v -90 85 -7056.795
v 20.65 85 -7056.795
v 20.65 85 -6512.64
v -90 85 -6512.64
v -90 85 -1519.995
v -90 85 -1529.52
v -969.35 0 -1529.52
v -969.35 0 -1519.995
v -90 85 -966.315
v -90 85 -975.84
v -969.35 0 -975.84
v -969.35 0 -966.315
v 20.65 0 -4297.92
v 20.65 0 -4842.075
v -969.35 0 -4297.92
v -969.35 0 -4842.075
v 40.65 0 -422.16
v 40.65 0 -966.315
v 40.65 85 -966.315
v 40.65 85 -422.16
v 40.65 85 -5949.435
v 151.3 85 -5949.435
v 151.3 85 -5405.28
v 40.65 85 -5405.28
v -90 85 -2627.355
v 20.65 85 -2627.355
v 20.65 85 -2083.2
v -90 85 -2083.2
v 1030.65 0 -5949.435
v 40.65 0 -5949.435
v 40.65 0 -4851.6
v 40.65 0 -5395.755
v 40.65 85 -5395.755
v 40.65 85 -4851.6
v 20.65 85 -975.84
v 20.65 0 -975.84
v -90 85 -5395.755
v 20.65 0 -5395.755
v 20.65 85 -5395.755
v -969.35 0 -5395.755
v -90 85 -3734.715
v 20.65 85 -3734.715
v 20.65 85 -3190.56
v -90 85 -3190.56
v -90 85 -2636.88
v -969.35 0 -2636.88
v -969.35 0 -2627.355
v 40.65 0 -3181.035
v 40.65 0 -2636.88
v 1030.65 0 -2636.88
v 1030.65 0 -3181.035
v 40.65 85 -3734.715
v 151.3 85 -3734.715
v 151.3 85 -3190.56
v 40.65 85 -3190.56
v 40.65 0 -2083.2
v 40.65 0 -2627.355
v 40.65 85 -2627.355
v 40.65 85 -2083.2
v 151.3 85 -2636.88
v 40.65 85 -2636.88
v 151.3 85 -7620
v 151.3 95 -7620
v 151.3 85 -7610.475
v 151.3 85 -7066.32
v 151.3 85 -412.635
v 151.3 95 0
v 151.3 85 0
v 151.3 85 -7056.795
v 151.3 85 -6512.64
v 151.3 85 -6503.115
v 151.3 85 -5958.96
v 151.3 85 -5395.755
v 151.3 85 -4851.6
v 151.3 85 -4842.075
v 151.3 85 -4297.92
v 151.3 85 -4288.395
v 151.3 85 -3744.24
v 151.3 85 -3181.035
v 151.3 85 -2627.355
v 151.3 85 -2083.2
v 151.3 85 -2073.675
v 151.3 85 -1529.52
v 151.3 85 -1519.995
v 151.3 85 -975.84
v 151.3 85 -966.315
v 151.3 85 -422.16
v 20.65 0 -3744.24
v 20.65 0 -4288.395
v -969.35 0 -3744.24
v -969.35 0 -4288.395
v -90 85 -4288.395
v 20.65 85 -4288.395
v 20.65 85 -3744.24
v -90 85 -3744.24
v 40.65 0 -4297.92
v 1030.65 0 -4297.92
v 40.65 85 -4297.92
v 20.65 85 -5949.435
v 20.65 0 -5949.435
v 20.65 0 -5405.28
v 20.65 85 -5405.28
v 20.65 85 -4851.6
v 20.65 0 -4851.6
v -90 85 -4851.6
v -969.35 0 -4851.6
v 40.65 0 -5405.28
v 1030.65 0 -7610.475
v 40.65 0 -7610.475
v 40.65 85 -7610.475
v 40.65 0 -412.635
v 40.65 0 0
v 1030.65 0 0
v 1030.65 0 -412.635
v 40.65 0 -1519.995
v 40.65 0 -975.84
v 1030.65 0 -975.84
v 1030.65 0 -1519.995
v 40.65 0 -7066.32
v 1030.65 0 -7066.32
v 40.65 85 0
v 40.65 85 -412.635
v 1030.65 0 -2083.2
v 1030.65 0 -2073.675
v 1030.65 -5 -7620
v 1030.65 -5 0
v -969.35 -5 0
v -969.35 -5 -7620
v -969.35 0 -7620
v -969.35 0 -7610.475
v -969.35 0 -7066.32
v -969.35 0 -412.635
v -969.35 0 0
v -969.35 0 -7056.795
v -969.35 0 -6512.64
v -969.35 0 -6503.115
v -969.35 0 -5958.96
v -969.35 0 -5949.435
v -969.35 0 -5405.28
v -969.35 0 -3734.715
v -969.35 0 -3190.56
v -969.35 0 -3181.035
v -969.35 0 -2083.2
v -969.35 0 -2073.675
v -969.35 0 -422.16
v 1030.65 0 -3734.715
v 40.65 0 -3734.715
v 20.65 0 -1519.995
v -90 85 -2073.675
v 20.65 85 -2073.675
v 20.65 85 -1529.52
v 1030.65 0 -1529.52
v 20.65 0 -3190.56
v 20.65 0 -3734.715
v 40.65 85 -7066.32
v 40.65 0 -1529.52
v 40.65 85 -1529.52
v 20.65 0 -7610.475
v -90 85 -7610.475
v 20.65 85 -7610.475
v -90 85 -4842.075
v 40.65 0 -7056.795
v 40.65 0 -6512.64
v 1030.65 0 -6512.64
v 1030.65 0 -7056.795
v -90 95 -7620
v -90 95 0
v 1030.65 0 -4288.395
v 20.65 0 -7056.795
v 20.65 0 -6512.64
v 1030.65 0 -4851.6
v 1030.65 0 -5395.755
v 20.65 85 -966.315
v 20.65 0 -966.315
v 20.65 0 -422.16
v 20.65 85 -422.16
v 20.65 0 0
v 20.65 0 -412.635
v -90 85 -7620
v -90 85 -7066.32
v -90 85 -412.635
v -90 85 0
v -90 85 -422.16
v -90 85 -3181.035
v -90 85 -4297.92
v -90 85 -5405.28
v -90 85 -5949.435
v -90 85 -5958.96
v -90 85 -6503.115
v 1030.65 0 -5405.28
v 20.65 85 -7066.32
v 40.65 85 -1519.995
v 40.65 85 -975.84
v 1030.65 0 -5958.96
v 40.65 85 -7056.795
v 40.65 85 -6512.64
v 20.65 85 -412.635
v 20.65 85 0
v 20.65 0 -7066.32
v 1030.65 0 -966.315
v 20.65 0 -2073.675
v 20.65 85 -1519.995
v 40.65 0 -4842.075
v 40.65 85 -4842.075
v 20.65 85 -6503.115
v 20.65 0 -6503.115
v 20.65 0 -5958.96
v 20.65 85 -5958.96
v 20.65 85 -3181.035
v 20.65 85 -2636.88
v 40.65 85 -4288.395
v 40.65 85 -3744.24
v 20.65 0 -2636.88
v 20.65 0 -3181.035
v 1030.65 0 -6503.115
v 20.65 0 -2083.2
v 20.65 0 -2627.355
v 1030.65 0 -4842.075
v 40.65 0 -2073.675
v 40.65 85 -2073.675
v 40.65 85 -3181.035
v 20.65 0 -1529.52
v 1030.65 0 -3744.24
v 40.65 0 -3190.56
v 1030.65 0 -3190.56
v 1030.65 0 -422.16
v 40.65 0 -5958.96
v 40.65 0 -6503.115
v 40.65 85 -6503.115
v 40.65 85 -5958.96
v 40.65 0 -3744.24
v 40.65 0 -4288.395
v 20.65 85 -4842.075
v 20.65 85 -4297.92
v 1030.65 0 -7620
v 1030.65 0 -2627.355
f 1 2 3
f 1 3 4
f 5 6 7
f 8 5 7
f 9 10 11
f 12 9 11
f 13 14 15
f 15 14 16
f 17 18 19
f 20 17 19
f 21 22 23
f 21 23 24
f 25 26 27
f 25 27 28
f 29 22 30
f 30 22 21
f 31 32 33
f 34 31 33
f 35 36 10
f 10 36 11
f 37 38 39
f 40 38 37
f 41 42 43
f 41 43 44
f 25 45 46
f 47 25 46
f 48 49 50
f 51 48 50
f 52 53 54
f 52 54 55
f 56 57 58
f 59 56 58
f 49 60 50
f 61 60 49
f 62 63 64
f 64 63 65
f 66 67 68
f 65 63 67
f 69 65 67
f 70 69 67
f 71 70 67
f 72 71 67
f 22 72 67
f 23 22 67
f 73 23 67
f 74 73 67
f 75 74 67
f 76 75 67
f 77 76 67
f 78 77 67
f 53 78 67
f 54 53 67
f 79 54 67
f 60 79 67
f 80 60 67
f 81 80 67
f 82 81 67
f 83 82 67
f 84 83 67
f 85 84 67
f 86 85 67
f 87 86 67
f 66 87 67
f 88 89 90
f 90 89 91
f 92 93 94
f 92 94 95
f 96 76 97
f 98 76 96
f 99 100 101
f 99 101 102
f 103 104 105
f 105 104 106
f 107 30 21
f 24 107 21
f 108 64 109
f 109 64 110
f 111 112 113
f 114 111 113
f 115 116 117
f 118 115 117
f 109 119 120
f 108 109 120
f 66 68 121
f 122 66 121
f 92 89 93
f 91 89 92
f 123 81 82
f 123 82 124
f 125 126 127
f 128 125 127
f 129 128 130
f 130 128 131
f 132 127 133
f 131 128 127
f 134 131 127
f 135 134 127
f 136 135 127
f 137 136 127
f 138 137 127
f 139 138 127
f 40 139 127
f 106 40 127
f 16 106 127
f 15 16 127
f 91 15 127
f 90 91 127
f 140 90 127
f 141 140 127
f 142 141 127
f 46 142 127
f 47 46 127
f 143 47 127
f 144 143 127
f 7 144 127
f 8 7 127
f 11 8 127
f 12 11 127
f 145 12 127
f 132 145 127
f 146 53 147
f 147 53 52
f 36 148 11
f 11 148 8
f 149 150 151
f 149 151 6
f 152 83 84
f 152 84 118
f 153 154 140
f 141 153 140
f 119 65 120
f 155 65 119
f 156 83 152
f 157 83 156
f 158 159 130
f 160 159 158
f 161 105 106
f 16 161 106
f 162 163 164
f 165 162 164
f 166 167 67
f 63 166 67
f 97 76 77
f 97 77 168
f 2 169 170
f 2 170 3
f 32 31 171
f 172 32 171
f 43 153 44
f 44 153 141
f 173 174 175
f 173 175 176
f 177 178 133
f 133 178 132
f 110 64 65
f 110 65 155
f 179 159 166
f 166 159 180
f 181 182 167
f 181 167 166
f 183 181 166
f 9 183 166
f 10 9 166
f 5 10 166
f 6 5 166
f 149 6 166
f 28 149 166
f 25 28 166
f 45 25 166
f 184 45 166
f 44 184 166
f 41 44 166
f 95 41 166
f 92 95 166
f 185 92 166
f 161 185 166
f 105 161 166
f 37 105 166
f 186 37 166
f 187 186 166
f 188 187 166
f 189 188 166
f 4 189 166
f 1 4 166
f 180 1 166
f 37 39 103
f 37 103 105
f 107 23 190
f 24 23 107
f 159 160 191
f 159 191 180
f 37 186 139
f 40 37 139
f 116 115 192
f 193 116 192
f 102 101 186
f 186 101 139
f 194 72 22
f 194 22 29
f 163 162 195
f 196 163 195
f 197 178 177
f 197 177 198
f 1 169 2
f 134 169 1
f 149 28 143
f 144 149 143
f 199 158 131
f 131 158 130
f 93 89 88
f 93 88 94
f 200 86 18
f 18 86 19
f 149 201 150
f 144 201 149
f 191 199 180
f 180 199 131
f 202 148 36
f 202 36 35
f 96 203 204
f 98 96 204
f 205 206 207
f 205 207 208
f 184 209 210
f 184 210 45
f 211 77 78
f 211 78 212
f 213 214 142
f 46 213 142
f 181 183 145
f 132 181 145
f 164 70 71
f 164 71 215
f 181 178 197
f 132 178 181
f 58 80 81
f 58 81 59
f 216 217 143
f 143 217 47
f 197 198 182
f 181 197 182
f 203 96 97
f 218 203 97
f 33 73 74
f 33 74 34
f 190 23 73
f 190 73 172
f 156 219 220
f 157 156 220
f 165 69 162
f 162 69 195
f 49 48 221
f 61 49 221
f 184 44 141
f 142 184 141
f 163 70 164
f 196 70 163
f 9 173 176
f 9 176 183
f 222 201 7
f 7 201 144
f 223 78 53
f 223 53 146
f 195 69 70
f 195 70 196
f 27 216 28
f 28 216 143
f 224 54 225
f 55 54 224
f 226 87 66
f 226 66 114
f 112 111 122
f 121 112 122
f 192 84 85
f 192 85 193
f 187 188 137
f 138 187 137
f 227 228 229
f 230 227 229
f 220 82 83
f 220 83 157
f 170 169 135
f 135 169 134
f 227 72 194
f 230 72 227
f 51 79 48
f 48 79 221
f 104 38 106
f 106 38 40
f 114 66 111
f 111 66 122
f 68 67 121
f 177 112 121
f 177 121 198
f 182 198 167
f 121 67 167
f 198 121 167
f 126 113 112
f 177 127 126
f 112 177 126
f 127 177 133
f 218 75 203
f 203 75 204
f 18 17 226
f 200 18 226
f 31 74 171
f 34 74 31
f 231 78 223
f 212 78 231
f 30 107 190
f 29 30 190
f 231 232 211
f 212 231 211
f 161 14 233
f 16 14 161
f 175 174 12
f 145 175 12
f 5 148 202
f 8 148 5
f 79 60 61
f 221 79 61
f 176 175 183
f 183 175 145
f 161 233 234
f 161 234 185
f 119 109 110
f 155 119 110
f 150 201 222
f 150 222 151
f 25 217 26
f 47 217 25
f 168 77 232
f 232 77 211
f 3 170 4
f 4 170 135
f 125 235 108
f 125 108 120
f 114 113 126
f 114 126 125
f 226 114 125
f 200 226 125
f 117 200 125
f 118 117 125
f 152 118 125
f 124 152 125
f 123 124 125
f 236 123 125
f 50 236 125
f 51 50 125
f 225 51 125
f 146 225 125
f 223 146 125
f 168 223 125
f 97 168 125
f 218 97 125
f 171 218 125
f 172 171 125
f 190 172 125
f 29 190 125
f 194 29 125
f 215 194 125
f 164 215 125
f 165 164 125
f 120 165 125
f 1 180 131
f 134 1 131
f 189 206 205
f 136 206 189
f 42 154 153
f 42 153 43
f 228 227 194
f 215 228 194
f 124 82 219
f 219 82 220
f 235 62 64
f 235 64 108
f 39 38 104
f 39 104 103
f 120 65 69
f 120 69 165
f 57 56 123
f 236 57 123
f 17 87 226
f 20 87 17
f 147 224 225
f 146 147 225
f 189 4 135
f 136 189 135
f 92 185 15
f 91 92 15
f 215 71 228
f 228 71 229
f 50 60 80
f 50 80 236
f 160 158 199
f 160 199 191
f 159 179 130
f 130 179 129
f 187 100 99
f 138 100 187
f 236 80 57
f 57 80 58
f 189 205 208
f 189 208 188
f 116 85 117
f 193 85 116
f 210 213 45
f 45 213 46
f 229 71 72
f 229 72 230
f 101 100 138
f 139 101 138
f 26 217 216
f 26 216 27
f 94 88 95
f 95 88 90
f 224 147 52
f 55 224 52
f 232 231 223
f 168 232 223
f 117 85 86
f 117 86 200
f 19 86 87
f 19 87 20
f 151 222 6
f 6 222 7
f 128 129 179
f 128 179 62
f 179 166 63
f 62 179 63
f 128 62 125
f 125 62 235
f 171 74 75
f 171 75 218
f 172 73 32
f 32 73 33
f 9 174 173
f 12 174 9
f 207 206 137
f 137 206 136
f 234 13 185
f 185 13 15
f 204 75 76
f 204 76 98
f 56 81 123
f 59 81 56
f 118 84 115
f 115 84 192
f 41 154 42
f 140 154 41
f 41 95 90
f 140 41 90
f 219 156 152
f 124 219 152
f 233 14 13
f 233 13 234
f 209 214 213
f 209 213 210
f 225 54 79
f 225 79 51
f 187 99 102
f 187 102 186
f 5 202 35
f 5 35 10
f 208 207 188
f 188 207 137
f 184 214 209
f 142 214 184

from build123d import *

# Parameters (mm, degrees)
BOSS_EXTRUDE1_DEPTH   = 7620
SKETCH7_W             = 110.65
SKETCH7_H             = 85
CUT_EXTRUDE3_DEPTH    = 7690.971678914
BOSS_EXTRUDE3_DEPTH   = 9.525
LPATTERN2_COUNT       = 14
LPATTERN2_PITCH       = 553.68
MIRROR2_COPY_1_DEPTH  = 9.525
MIRROR2_COPY_2_DEPTH  = 9.525
MIRROR2_COPY_3_DEPTH  = 9.525
MIRROR2_COPY_4_DEPTH  = 9.525
MIRROR2_COPY_5_DEPTH  = 9.525
MIRROR2_COPY_6_DEPTH  = 9.525
MIRROR2_COPY_7_DEPTH  = 9.525
MIRROR2_COPY_8_DEPTH  = 9.525
MIRROR2_COPY_9_DEPTH  = 9.525
MIRROR2_COPY_10_DEPTH = 9.525
MIRROR2_COPY_11_DEPTH = 9.525
MIRROR2_COPY_12_DEPTH = 9.525
MIRROR2_COPY_13_DEPTH = 9.525


with BuildPart() as part:
    # Sketch1 → Boss-Extrude1 (new body)
    with BuildSketch(Plane.XY):
        Polygon((-90, 95), (151.3, 95), (151.3, 0), (1030.65, 0), (1030.65, -5), (-969.35, -5), (-969.35, 0), (-90, 0), align=None)
    extrude(amount=-BOSS_EXTRUDE1_DEPTH)

    # Sketch7 → Cut-Extrude3 (cut, through all)
    with BuildSketch(Plane(origin=(0, 0, -7620), x_dir=(-1, 0, 0), z_dir=(0, 0, -1))):
        with Locations((-95.975, 42.5)):
            Rectangle(SKETCH7_W, SKETCH7_H)
        with Locations((34.675, 42.5)):
            Rectangle(SKETCH7_W, SKETCH7_H)
    extrude(amount=-CUT_EXTRUDE3_DEPTH, mode=Mode.SUBTRACT)

    # Sketch8 → Boss-Extrude3 (add)
    with BuildSketch(Plane(origin=(0, 0, -7620), x_dir=(-1, 0, 0), z_dir=(0, 0, -1))):
        Polygon((-40.65, 0), (-40.65, 85), (-151.3, 85), (-1030.65, 0), align=None)
    boss_extrude3 = extrude(amount=-BOSS_EXTRUDE3_DEPTH)

    # LPattern2: Boss-Extrude3 ×14
    with Locations(*[(0, 0, i * LPATTERN2_PITCH) for i in range(1, LPATTERN2_COUNT)]):
        add(boss_extrude3)

    # Mirror2: Boss-Extrude3 across plane
    add(boss_extrude3.mirror(Plane(origin=(30.65, 0, 0), x_dir=(0, 0, 1), z_dir=(1, 0, 0))))

    # Mirror2 copy 1 sketch → Mirror2 copy 1 (add)
    with BuildSketch(Plane(origin=(61.3, 0, -7066.32), x_dir=(1, 0, 0), z_dir=(0, 0, -1))):
        Polygon((-40.65, 0), (-40.65, -85), (-151.3, -85), (-1030.65, 0), align=None)
    extrude(amount=-MIRROR2_COPY_1_DEPTH)

    # Mirror2 copy 2 sketch → Mirror2 copy 2 (add)
    with BuildSketch(Plane(origin=(61.3, 0, -6512.64), x_dir=(1, 0, 0), z_dir=(0, 0, -1))):
        Polygon((-40.65, 0), (-40.65, -85), (-151.3, -85), (-1030.65, 0), align=None)
    extrude(amount=-MIRROR2_COPY_2_DEPTH)

    # Mirror2 copy 3 sketch → Mirror2 copy 3 (add)
    with BuildSketch(Plane(origin=(61.3, 0, -5958.96), x_dir=(1, 0, 0), z_dir=(0, 0, -1))):
        Polygon((-40.65, 0), (-40.65, -85), (-151.3, -85), (-1030.65, 0), align=None)
    extrude(amount=-MIRROR2_COPY_3_DEPTH)

    # Mirror2 copy 4 sketch → Mirror2 copy 4 (add)
    with BuildSketch(Plane(origin=(61.3, 0, -5405.28), x_dir=(1, 0, 0), z_dir=(0, 0, -1))):
        Polygon((-40.65, 0), (-40.65, -85), (-151.3, -85), (-1030.65, 0), align=None)
    extrude(amount=-MIRROR2_COPY_4_DEPTH)

    # Mirror2 copy 5 sketch → Mirror2 copy 5 (add)
    with BuildSketch(Plane(origin=(61.3, 0, -4851.6), x_dir=(1, 0, 0), z_dir=(0, 0, -1))):
        Polygon((-40.65, 0), (-40.65, -85), (-151.3, -85), (-1030.65, 0), align=None)
    extrude(amount=-MIRROR2_COPY_5_DEPTH)

    # Mirror2 copy 6 sketch → Mirror2 copy 6 (add)
    with BuildSketch(Plane(origin=(61.3, 0, -4297.92), x_dir=(1, 0, 0), z_dir=(0, 0, -1))):
        Polygon((-40.65, 0), (-40.65, -85), (-151.3, -85), (-1030.65, 0), align=None)
    extrude(amount=-MIRROR2_COPY_6_DEPTH)

    # Mirror2 copy 7 sketch → Mirror2 copy 7 (add)
    with BuildSketch(Plane(origin=(61.3, 0, -3744.24), x_dir=(1, 0, 0), z_dir=(0, 0, -1))):
        Polygon((-40.65, 0), (-40.65, -85), (-151.3, -85), (-1030.65, 0), align=None)
    extrude(amount=-MIRROR2_COPY_7_DEPTH)

    # Mirror2 copy 8 sketch → Mirror2 copy 8 (add)
    with BuildSketch(Plane(origin=(61.3, 0, -3190.56), x_dir=(1, 0, 0), z_dir=(0, 0, -1))):
        Polygon((-40.65, 0), (-40.65, -85), (-151.3, -85), (-1030.65, 0), align=None)
    extrude(amount=-MIRROR2_COPY_8_DEPTH)

    # Mirror2 copy 9 sketch → Mirror2 copy 9 (add)
    with BuildSketch(Plane(origin=(61.3, 0, -2636.88), x_dir=(1, 0, 0), z_dir=(0, 0, -1))):
        Polygon((-40.65, 0), (-40.65, -85), (-151.3, -85), (-1030.65, 0), align=None)
    extrude(amount=-MIRROR2_COPY_9_DEPTH)

    # Mirror2 copy 10 sketch → Mirror2 copy 10 (add)
    with BuildSketch(Plane(origin=(61.3, 0, -2083.2), x_dir=(1, 0, 0), z_dir=(0, 0, -1))):
        Polygon((-40.65, 0), (-40.65, -85), (-151.3, -85), (-1030.65, 0), align=None)
    extrude(amount=-MIRROR2_COPY_10_DEPTH)

    # Mirror2 copy 11 sketch → Mirror2 copy 11 (add)
    with BuildSketch(Plane(origin=(61.3, 0, -1529.52), x_dir=(1, 0, 0), z_dir=(0, 0, -1))):
        Polygon((-40.65, 0), (-40.65, -85), (-151.3, -85), (-1030.65, 0), align=None)
    extrude(amount=-MIRROR2_COPY_11_DEPTH)

    # Mirror2 copy 12 sketch → Mirror2 copy 12 (add)
    with BuildSketch(Plane(origin=(61.3, 0, -975.84), x_dir=(1, 0, 0), z_dir=(0, 0, -1))):
        Polygon((-40.65, 0), (-40.65, -85), (-151.3, -85), (-1030.65, 0), align=None)
    extrude(amount=-MIRROR2_COPY_12_DEPTH)

    # Mirror2 copy 13 sketch → Mirror2 copy 13 (add)
    with BuildSketch(Plane(origin=(61.3, 0, -422.16), x_dir=(1, 0, 0), z_dir=(0, 0, -1))):
        Polygon((-40.65, 0), (-40.65, -85), (-151.3, -85), (-1030.65, 0), align=None)
    extrude(amount=-MIRROR2_COPY_13_DEPTH)


solid = part.part
